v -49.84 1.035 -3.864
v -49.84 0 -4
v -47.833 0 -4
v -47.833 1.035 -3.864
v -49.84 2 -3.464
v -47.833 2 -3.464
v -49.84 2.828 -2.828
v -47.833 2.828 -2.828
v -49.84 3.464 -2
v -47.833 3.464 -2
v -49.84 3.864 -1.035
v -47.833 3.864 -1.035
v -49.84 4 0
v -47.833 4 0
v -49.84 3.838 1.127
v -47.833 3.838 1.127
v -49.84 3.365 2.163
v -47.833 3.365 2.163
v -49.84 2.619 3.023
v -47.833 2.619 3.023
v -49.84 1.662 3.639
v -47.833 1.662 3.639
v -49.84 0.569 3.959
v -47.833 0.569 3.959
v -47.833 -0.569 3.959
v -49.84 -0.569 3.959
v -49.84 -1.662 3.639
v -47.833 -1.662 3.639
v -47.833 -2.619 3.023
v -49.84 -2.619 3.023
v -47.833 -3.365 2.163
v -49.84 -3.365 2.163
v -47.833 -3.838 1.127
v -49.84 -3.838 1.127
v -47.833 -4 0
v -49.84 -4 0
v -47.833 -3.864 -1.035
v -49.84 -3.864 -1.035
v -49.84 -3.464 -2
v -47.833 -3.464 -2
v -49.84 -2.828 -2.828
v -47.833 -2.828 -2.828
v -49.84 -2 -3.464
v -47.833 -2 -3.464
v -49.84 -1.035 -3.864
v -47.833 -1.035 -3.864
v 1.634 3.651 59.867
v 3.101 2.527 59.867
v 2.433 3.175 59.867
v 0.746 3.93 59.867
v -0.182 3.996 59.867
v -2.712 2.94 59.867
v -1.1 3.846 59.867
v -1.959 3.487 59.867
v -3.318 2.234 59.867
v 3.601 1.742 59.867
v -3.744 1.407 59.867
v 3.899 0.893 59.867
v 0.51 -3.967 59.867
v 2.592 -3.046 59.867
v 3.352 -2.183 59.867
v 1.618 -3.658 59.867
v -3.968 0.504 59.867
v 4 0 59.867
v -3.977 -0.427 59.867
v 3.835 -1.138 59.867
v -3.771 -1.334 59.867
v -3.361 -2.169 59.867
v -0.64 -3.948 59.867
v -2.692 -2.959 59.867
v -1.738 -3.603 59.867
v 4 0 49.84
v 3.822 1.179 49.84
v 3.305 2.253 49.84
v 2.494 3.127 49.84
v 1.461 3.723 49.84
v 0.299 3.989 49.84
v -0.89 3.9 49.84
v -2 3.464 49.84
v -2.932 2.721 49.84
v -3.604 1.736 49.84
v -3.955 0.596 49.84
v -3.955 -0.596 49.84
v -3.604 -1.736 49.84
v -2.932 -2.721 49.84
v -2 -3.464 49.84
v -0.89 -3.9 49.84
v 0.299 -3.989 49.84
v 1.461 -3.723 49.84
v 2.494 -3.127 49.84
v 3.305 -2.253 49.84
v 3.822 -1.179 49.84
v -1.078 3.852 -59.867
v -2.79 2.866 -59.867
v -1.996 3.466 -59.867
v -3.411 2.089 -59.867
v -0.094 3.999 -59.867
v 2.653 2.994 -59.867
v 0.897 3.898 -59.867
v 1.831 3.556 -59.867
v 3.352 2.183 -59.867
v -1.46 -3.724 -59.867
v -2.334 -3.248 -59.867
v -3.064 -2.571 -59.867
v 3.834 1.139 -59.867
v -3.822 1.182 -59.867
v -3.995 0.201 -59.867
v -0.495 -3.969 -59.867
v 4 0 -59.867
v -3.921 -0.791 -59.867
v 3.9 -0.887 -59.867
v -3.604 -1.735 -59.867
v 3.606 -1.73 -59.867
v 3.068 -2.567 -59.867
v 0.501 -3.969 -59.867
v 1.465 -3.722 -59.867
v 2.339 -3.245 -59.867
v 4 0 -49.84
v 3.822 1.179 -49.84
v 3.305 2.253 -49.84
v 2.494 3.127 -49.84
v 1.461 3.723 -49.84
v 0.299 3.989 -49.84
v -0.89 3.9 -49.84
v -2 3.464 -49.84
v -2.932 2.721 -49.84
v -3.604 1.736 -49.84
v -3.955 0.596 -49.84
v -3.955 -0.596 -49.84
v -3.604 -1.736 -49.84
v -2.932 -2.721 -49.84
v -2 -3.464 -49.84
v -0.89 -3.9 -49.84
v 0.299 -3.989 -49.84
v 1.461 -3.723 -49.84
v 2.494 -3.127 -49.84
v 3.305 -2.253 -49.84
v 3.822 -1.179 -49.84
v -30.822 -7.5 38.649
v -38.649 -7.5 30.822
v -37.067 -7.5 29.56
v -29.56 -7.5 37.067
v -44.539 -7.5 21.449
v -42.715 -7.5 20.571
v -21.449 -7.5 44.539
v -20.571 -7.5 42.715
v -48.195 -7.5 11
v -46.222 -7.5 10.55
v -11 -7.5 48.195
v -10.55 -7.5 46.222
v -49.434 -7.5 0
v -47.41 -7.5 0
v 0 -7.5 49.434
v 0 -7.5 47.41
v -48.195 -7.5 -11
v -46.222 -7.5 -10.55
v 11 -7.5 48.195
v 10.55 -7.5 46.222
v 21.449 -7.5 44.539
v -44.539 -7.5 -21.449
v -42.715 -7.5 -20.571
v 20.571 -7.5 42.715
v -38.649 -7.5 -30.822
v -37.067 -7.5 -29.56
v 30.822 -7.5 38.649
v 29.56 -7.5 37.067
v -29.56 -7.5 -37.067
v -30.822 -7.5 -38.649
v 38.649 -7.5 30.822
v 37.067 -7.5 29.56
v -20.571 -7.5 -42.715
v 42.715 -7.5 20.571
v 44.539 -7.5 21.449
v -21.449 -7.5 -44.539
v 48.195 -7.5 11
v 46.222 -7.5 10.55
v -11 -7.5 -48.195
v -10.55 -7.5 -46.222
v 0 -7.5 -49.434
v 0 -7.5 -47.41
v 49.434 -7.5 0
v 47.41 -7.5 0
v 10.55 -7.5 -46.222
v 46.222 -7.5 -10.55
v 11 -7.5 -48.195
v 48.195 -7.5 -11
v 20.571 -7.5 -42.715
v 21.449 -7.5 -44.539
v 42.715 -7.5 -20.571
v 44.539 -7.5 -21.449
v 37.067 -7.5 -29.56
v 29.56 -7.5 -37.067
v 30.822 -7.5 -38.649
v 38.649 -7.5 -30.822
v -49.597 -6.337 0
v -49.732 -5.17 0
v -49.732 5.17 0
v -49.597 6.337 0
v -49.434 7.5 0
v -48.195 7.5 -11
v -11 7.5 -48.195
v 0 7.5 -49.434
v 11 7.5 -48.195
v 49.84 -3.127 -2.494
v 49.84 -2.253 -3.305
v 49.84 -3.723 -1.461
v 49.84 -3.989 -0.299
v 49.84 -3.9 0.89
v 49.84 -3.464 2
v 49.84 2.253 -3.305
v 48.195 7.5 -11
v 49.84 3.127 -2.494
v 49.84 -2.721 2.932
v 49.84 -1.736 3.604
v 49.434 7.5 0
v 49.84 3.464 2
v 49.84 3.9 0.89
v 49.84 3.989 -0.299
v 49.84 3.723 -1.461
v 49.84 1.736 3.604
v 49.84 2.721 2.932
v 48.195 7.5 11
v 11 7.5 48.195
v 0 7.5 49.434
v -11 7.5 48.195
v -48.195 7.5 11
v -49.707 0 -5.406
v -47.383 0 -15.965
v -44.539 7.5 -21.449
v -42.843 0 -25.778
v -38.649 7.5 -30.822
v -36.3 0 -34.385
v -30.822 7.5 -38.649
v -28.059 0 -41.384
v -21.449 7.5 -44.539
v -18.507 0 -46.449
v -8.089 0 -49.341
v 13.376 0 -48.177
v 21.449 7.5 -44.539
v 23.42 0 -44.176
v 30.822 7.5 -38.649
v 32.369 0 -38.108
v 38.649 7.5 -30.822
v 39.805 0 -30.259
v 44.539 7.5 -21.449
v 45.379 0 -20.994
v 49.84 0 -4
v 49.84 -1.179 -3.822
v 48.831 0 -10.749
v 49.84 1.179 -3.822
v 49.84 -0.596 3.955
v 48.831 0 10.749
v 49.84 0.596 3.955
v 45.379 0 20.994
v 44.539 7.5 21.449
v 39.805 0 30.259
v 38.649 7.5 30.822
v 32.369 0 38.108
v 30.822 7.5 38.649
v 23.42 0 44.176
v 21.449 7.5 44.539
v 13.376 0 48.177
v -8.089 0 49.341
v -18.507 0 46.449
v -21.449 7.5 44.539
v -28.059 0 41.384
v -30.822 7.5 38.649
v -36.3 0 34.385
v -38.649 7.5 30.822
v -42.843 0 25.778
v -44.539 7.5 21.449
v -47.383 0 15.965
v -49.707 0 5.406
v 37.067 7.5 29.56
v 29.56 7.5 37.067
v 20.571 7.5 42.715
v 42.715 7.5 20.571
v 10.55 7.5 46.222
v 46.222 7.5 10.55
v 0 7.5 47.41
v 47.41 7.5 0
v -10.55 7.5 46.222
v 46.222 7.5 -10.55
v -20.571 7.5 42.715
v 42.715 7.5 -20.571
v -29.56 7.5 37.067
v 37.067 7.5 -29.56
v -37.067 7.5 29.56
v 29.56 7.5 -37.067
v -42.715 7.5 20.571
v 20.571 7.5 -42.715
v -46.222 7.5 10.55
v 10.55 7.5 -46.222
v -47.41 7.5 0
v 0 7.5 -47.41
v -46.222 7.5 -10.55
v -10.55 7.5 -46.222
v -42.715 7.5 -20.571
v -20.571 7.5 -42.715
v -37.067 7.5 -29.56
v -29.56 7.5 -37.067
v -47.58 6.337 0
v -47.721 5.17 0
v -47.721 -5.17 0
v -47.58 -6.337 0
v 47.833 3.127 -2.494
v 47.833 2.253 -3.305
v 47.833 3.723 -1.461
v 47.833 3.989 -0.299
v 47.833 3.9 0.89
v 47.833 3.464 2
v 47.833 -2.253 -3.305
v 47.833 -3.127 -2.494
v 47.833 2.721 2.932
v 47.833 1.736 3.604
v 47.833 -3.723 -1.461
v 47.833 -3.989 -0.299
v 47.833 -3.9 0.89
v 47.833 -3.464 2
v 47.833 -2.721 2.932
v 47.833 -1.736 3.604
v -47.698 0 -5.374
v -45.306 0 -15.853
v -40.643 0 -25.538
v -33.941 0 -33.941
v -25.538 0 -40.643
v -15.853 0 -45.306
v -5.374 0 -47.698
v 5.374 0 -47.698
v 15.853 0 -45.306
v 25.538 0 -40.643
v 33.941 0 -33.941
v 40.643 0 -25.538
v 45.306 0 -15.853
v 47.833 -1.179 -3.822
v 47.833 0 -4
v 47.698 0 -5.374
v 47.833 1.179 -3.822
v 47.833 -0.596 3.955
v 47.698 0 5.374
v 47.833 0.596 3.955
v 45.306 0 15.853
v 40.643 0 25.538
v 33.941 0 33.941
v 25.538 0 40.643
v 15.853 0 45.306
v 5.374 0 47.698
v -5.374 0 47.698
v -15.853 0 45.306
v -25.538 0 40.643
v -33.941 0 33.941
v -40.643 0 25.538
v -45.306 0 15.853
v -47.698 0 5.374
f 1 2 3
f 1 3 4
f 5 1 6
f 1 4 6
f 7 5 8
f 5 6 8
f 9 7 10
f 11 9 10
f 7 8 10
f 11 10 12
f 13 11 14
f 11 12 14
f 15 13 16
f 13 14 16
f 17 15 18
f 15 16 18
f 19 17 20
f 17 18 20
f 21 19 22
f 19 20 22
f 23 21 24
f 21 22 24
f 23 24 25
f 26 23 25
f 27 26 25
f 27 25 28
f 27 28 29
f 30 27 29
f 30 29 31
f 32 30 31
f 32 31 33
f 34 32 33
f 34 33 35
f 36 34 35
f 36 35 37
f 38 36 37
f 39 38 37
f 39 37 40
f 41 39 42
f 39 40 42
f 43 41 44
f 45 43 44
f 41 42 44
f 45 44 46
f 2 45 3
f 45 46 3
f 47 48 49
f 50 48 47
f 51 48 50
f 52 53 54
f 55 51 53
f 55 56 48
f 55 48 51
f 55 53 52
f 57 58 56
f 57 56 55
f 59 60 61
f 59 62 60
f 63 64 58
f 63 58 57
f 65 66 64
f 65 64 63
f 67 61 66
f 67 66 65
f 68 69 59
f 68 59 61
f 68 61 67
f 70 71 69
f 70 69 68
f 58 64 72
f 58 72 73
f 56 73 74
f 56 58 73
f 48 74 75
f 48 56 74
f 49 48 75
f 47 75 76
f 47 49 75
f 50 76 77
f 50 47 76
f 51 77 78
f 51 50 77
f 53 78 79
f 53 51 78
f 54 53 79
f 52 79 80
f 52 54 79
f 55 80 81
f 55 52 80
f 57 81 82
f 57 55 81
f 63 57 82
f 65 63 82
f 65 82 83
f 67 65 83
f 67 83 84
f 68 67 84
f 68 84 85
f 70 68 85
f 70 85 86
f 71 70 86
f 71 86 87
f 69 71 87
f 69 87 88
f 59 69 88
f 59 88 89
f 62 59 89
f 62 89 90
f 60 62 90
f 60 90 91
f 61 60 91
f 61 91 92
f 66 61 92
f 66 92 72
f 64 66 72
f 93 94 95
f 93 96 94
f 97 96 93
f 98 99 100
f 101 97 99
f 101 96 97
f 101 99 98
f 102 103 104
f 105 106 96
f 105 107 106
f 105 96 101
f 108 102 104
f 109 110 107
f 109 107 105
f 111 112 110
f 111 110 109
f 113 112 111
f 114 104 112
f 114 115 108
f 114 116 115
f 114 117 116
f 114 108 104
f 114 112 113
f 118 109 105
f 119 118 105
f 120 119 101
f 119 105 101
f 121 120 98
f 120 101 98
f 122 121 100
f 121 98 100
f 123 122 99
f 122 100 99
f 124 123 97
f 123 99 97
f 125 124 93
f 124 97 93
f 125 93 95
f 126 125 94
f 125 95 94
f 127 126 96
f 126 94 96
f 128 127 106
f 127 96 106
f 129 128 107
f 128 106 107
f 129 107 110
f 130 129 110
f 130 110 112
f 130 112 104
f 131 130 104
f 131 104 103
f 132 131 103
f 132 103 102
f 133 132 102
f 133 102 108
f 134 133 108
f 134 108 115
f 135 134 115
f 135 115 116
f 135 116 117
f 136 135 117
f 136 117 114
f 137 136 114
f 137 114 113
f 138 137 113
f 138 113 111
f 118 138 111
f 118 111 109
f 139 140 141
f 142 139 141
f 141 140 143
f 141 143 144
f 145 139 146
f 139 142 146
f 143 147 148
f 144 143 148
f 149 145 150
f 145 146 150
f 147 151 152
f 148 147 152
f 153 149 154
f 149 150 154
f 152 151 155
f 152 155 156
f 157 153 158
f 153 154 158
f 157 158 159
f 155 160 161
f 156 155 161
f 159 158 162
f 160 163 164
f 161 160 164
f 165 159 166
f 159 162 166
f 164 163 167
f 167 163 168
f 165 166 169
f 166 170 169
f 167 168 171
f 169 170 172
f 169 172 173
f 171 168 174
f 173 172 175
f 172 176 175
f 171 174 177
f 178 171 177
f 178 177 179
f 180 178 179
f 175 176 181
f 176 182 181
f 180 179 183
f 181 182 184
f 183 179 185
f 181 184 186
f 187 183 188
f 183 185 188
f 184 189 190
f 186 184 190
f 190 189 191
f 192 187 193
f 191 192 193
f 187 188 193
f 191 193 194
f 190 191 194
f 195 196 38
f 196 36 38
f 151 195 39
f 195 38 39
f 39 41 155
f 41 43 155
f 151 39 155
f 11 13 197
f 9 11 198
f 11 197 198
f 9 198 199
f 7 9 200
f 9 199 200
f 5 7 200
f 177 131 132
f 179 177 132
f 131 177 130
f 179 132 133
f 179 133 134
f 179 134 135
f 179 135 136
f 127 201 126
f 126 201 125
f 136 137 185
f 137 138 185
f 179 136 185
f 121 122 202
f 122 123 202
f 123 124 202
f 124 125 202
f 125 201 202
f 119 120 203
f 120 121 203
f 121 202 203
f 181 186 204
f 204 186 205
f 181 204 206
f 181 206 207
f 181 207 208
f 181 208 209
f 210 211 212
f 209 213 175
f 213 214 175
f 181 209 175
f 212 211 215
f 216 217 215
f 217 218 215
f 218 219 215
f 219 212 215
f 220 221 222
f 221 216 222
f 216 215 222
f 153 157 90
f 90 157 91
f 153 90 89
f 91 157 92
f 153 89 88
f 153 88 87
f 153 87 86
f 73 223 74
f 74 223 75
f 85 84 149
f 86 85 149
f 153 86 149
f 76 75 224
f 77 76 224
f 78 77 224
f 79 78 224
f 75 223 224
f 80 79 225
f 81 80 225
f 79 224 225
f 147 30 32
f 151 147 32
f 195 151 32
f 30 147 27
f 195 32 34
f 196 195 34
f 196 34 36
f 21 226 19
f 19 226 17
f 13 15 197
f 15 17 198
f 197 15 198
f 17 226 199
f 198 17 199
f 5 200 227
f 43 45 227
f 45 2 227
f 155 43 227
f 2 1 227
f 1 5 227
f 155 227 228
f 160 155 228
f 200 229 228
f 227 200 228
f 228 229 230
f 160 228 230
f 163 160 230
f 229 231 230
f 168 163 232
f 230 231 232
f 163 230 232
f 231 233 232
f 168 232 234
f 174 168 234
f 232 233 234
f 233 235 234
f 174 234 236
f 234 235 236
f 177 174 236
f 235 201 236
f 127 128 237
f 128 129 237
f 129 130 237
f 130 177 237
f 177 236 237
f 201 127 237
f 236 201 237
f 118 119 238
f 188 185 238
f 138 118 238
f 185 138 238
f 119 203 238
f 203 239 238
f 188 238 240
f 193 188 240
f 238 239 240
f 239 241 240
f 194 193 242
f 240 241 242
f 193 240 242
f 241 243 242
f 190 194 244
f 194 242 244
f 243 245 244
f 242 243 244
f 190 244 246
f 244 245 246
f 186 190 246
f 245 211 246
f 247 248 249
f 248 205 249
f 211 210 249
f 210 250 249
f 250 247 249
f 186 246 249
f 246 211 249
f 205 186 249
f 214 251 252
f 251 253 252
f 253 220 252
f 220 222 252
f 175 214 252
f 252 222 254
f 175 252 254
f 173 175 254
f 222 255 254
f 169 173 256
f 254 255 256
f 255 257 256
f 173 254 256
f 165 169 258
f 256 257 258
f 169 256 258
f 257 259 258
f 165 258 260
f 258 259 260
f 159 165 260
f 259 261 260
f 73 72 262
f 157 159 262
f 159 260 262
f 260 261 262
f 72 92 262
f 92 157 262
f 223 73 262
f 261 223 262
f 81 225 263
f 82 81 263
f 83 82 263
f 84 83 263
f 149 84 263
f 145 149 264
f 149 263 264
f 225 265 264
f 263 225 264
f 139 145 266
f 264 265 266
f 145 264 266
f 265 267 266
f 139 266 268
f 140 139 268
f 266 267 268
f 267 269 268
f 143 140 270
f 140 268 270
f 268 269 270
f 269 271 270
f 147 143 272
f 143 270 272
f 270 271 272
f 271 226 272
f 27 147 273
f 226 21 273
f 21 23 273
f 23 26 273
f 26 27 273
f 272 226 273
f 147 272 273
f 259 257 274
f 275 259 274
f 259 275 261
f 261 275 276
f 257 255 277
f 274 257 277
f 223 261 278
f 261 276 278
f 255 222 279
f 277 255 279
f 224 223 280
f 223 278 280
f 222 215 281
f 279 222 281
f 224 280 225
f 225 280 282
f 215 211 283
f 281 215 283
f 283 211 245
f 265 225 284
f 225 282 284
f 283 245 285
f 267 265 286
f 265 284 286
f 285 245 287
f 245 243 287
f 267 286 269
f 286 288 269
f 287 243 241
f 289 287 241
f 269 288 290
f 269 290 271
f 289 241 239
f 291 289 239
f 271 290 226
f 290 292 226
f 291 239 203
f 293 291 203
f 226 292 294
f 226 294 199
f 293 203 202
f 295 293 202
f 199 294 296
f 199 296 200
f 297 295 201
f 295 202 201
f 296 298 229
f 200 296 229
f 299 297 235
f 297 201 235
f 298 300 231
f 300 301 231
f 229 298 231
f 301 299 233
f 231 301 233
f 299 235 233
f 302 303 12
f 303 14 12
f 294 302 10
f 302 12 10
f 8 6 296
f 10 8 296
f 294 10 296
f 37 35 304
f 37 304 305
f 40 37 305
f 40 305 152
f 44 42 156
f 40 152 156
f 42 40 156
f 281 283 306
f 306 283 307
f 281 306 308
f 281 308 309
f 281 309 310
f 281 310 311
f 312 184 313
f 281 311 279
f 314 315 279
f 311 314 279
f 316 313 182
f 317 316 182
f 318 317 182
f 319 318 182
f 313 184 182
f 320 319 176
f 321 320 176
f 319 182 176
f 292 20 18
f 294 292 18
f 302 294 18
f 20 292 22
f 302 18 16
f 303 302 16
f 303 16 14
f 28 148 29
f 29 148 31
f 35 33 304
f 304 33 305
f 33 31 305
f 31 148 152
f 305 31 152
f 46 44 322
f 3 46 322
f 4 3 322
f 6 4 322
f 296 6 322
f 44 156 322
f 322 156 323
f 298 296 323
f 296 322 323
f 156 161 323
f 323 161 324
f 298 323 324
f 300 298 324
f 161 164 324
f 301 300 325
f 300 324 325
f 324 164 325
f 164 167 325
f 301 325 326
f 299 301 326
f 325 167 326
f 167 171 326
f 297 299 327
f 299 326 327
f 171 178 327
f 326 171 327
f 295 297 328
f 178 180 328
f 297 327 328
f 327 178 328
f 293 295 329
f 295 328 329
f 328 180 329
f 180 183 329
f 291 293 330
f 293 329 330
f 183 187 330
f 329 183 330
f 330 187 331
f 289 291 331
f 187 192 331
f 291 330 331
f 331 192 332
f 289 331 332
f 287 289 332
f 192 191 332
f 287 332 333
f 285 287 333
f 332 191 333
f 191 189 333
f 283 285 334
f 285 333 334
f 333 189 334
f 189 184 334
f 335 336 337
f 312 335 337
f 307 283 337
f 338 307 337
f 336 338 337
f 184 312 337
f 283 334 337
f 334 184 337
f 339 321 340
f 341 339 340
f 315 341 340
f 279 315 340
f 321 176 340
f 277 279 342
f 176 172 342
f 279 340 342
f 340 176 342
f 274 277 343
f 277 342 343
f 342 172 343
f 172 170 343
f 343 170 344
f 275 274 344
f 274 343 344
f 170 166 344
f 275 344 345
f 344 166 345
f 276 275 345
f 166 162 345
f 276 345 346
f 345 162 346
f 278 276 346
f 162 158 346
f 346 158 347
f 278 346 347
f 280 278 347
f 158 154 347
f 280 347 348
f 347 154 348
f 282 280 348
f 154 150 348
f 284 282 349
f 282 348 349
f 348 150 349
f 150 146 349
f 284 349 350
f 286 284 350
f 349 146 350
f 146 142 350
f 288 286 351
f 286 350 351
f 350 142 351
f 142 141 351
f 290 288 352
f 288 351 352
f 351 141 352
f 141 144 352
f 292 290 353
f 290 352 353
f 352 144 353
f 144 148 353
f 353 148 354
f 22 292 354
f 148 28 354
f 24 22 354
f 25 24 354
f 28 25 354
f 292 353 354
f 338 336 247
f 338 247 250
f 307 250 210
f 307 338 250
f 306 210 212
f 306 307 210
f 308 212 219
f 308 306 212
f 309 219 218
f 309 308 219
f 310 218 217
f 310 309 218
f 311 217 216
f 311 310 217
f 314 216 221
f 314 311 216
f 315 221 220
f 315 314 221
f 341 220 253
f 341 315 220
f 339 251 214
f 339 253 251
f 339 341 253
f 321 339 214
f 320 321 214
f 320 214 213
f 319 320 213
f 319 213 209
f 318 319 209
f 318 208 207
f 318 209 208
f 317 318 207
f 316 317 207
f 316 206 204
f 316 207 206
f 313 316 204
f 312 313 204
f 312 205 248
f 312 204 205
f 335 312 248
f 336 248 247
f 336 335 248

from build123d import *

# Parameters (mm, degrees)
SKETCH2_R               = 4
CUT_EXTRUDE1_DEPTH      = 51
CUT_EXTRUDE1_DEPTH_BACK = 51
SKETCH6_R               = 4
BOSS_EXTRUDE1_DEPTH     = 10.160257


with BuildPart() as part:
    # Sketch1 → Revolve1 (revolve)
    with BuildSketch(Plane.XY):
        with BuildLine():
            Line((-49.434299833, 7.5), (-47.410441888, 7.5))
            ThreePointArc((-47.410441888, 7.5), (-48, 0), (-47.410441888, -7.5))
            Line((-47.410441888, -7.5), (-49.434299833, -7.5))
            ThreePointArc((-49.434299833, -7.5), (-50, 0), (-49.434299833, 7.5))
        make_face()
    revolve(axis=Axis((0, 31.203935911, 0), (0, -1, 0)))

    # Sketch2 → Cut-Extrude1 (cut, two sides)
    with BuildSketch(Plane(origin=(0, 0, 0), x_dir=(0, 0, -1), z_dir=(1, 0, 0))) as cut_extrude1_sk:
        Circle(SKETCH2_R)
    extrude(amount=CUT_EXTRUDE1_DEPTH, mode=Mode.SUBTRACT)
    extrude(cut_extrude1_sk.sketch, amount=-CUT_EXTRUDE1_DEPTH_BACK, mode=Mode.SUBTRACT)

    # Sketch6 → Boss-Extrude1 (add)
    with BuildSketch(Plane.XY.offset(60)):
        Circle(SKETCH6_R)
    boss_extrude1 = extrude(amount=-BOSS_EXTRUDE1_DEPTH)

    # Mirror1: Boss-Extrude1 across plane
    add(boss_extrude1.mirror(Plane.XY))

    # Sketch8 → Cut-Revolve1 (revolve, cut)
    with BuildSketch(Plane(origin=(0, 0, 0), x_dir=(0, 0, -1), z_dir=(1, 0, 0))):
        with BuildLine():
            Line((0, 70), (0, 60))
            ThreePointArc((0, 60), (-60, 0), (0, -60))
            Line((0, -60), (0, -70))
            ThreePointArc((0, -70), (-70, 0), (0, 70))
        make_face()
    revolve(axis=Axis((0, 45.192031549, 0), (0, -1, 0)), mode=Mode.SUBTRACT)


solid = part.part
